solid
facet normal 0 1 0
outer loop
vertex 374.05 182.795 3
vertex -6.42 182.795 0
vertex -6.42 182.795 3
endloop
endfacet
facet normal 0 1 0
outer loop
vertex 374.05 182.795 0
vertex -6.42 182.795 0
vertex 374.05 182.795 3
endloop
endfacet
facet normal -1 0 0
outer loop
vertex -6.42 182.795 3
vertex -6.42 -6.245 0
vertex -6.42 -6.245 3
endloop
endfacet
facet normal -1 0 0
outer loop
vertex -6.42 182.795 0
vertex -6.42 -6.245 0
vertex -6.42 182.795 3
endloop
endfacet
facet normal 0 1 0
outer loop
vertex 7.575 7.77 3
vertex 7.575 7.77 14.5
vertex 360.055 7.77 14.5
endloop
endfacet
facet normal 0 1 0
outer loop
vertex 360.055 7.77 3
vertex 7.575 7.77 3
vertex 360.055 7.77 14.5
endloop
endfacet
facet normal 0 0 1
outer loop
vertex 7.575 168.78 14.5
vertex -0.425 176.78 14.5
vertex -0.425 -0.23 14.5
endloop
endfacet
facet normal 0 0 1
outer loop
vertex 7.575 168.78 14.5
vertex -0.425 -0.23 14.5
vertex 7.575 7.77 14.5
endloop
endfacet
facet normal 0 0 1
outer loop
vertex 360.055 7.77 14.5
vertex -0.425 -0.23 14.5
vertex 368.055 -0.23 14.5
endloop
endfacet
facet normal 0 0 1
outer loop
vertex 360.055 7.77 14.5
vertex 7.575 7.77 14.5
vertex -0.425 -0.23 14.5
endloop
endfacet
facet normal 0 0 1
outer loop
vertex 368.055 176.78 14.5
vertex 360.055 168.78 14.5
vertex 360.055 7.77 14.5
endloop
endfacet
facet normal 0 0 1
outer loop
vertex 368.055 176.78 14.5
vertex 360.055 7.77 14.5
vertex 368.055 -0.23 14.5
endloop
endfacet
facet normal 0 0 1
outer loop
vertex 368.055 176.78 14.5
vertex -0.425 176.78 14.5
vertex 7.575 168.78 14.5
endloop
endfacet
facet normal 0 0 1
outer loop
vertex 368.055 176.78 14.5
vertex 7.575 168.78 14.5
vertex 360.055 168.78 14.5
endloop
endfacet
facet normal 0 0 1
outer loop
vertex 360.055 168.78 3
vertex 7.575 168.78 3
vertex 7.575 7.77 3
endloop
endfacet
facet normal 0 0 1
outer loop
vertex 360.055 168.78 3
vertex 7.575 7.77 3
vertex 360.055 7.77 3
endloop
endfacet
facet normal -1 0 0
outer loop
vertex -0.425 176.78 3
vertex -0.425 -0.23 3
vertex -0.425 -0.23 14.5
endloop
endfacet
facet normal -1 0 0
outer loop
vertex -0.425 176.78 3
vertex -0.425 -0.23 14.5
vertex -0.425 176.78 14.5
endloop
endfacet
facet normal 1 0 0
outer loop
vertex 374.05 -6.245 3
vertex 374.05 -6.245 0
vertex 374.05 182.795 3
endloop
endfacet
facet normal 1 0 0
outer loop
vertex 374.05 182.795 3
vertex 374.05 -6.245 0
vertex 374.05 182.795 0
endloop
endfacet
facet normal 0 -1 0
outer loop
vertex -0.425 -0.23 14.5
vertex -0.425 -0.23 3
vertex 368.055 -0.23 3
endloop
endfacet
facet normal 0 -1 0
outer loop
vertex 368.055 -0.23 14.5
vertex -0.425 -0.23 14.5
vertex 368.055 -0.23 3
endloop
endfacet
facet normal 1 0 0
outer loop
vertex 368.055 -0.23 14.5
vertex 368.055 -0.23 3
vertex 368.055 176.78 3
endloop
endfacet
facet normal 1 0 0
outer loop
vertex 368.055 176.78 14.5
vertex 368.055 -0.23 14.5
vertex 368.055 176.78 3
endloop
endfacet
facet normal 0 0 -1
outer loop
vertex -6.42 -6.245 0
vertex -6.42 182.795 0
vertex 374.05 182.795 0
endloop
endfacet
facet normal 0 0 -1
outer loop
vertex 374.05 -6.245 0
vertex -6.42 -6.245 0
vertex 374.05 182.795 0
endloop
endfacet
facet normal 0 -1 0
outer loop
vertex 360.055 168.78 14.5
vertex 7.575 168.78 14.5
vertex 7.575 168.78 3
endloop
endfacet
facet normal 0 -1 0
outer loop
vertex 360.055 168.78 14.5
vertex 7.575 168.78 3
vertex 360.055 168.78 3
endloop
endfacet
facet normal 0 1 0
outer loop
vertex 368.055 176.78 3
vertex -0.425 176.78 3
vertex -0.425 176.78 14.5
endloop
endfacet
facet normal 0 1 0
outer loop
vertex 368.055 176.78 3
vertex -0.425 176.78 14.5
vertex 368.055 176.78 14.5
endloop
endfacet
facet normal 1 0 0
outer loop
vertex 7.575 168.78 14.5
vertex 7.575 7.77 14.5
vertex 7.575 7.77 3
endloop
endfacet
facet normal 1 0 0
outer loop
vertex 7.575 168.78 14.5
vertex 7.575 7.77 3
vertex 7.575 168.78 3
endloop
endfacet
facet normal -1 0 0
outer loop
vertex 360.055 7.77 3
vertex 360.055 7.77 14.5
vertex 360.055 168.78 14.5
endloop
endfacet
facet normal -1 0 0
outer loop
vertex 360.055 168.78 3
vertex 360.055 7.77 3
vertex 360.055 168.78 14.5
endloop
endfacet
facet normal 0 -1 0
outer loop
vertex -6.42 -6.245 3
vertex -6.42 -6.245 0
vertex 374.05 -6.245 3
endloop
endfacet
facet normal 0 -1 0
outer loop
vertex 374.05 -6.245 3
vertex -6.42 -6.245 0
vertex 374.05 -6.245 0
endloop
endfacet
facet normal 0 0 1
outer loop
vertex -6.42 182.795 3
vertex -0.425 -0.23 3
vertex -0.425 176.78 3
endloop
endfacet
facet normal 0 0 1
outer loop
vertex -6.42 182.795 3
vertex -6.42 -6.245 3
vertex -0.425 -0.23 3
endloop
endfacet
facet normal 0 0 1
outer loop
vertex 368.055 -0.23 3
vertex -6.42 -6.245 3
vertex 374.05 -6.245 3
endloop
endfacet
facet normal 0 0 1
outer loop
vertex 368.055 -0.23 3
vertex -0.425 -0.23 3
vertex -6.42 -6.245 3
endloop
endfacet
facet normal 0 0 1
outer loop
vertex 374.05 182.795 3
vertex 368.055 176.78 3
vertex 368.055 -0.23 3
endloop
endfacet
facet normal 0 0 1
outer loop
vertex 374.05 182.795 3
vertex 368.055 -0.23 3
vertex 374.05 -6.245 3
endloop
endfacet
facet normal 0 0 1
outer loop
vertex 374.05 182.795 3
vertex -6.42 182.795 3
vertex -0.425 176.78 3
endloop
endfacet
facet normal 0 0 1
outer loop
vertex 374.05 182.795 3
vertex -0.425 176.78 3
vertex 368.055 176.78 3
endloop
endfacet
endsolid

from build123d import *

# Parameters (mm, degrees)
SKETCH_2_W          = 380.47
SKETCH_2_H          = 189.04
EXTRUDE_1_DEPTH     = 3
SKETCH_3_W          = 368.48
SKETCH_3_H          = 177.01
EXTRUDE_2_DEPTH     = 11.5
SKETCH_4_W          = 352.48
SKETCH_4_H          = 161.01
CUT_EXTRUDE_1_DEPTH = 11.5


with BuildPart() as part:
    # 草图2 → 凸台-拉伸1 (new body)
    with BuildSketch(Plane.XY):
        with Locations((183.815306963, 88.27515573)):
            Rectangle(SKETCH_2_W, SKETCH_2_H)
    extrude(amount=EXTRUDE_1_DEPTH)

    # 草图3 → 凸台-拉伸2 (add)
    with BuildSketch(Plane.XY.offset(3)):
        with Locations((183.815306963, 88.27515573)):
            Rectangle(SKETCH_3_W, SKETCH_3_H)
    extrude(amount=EXTRUDE_2_DEPTH)

    # 草图4 → 切除-拉伸1 (cut)
    with BuildSketch(Plane.XY.offset(14.5)):
        with Locations((183.815306963, 88.27515573)):
            Rectangle(SKETCH_4_W, SKETCH_4_H)
    extrude(amount=-CUT_EXTRUDE_1_DEPTH, mode=Mode.SUBTRACT)


solid = part.part
